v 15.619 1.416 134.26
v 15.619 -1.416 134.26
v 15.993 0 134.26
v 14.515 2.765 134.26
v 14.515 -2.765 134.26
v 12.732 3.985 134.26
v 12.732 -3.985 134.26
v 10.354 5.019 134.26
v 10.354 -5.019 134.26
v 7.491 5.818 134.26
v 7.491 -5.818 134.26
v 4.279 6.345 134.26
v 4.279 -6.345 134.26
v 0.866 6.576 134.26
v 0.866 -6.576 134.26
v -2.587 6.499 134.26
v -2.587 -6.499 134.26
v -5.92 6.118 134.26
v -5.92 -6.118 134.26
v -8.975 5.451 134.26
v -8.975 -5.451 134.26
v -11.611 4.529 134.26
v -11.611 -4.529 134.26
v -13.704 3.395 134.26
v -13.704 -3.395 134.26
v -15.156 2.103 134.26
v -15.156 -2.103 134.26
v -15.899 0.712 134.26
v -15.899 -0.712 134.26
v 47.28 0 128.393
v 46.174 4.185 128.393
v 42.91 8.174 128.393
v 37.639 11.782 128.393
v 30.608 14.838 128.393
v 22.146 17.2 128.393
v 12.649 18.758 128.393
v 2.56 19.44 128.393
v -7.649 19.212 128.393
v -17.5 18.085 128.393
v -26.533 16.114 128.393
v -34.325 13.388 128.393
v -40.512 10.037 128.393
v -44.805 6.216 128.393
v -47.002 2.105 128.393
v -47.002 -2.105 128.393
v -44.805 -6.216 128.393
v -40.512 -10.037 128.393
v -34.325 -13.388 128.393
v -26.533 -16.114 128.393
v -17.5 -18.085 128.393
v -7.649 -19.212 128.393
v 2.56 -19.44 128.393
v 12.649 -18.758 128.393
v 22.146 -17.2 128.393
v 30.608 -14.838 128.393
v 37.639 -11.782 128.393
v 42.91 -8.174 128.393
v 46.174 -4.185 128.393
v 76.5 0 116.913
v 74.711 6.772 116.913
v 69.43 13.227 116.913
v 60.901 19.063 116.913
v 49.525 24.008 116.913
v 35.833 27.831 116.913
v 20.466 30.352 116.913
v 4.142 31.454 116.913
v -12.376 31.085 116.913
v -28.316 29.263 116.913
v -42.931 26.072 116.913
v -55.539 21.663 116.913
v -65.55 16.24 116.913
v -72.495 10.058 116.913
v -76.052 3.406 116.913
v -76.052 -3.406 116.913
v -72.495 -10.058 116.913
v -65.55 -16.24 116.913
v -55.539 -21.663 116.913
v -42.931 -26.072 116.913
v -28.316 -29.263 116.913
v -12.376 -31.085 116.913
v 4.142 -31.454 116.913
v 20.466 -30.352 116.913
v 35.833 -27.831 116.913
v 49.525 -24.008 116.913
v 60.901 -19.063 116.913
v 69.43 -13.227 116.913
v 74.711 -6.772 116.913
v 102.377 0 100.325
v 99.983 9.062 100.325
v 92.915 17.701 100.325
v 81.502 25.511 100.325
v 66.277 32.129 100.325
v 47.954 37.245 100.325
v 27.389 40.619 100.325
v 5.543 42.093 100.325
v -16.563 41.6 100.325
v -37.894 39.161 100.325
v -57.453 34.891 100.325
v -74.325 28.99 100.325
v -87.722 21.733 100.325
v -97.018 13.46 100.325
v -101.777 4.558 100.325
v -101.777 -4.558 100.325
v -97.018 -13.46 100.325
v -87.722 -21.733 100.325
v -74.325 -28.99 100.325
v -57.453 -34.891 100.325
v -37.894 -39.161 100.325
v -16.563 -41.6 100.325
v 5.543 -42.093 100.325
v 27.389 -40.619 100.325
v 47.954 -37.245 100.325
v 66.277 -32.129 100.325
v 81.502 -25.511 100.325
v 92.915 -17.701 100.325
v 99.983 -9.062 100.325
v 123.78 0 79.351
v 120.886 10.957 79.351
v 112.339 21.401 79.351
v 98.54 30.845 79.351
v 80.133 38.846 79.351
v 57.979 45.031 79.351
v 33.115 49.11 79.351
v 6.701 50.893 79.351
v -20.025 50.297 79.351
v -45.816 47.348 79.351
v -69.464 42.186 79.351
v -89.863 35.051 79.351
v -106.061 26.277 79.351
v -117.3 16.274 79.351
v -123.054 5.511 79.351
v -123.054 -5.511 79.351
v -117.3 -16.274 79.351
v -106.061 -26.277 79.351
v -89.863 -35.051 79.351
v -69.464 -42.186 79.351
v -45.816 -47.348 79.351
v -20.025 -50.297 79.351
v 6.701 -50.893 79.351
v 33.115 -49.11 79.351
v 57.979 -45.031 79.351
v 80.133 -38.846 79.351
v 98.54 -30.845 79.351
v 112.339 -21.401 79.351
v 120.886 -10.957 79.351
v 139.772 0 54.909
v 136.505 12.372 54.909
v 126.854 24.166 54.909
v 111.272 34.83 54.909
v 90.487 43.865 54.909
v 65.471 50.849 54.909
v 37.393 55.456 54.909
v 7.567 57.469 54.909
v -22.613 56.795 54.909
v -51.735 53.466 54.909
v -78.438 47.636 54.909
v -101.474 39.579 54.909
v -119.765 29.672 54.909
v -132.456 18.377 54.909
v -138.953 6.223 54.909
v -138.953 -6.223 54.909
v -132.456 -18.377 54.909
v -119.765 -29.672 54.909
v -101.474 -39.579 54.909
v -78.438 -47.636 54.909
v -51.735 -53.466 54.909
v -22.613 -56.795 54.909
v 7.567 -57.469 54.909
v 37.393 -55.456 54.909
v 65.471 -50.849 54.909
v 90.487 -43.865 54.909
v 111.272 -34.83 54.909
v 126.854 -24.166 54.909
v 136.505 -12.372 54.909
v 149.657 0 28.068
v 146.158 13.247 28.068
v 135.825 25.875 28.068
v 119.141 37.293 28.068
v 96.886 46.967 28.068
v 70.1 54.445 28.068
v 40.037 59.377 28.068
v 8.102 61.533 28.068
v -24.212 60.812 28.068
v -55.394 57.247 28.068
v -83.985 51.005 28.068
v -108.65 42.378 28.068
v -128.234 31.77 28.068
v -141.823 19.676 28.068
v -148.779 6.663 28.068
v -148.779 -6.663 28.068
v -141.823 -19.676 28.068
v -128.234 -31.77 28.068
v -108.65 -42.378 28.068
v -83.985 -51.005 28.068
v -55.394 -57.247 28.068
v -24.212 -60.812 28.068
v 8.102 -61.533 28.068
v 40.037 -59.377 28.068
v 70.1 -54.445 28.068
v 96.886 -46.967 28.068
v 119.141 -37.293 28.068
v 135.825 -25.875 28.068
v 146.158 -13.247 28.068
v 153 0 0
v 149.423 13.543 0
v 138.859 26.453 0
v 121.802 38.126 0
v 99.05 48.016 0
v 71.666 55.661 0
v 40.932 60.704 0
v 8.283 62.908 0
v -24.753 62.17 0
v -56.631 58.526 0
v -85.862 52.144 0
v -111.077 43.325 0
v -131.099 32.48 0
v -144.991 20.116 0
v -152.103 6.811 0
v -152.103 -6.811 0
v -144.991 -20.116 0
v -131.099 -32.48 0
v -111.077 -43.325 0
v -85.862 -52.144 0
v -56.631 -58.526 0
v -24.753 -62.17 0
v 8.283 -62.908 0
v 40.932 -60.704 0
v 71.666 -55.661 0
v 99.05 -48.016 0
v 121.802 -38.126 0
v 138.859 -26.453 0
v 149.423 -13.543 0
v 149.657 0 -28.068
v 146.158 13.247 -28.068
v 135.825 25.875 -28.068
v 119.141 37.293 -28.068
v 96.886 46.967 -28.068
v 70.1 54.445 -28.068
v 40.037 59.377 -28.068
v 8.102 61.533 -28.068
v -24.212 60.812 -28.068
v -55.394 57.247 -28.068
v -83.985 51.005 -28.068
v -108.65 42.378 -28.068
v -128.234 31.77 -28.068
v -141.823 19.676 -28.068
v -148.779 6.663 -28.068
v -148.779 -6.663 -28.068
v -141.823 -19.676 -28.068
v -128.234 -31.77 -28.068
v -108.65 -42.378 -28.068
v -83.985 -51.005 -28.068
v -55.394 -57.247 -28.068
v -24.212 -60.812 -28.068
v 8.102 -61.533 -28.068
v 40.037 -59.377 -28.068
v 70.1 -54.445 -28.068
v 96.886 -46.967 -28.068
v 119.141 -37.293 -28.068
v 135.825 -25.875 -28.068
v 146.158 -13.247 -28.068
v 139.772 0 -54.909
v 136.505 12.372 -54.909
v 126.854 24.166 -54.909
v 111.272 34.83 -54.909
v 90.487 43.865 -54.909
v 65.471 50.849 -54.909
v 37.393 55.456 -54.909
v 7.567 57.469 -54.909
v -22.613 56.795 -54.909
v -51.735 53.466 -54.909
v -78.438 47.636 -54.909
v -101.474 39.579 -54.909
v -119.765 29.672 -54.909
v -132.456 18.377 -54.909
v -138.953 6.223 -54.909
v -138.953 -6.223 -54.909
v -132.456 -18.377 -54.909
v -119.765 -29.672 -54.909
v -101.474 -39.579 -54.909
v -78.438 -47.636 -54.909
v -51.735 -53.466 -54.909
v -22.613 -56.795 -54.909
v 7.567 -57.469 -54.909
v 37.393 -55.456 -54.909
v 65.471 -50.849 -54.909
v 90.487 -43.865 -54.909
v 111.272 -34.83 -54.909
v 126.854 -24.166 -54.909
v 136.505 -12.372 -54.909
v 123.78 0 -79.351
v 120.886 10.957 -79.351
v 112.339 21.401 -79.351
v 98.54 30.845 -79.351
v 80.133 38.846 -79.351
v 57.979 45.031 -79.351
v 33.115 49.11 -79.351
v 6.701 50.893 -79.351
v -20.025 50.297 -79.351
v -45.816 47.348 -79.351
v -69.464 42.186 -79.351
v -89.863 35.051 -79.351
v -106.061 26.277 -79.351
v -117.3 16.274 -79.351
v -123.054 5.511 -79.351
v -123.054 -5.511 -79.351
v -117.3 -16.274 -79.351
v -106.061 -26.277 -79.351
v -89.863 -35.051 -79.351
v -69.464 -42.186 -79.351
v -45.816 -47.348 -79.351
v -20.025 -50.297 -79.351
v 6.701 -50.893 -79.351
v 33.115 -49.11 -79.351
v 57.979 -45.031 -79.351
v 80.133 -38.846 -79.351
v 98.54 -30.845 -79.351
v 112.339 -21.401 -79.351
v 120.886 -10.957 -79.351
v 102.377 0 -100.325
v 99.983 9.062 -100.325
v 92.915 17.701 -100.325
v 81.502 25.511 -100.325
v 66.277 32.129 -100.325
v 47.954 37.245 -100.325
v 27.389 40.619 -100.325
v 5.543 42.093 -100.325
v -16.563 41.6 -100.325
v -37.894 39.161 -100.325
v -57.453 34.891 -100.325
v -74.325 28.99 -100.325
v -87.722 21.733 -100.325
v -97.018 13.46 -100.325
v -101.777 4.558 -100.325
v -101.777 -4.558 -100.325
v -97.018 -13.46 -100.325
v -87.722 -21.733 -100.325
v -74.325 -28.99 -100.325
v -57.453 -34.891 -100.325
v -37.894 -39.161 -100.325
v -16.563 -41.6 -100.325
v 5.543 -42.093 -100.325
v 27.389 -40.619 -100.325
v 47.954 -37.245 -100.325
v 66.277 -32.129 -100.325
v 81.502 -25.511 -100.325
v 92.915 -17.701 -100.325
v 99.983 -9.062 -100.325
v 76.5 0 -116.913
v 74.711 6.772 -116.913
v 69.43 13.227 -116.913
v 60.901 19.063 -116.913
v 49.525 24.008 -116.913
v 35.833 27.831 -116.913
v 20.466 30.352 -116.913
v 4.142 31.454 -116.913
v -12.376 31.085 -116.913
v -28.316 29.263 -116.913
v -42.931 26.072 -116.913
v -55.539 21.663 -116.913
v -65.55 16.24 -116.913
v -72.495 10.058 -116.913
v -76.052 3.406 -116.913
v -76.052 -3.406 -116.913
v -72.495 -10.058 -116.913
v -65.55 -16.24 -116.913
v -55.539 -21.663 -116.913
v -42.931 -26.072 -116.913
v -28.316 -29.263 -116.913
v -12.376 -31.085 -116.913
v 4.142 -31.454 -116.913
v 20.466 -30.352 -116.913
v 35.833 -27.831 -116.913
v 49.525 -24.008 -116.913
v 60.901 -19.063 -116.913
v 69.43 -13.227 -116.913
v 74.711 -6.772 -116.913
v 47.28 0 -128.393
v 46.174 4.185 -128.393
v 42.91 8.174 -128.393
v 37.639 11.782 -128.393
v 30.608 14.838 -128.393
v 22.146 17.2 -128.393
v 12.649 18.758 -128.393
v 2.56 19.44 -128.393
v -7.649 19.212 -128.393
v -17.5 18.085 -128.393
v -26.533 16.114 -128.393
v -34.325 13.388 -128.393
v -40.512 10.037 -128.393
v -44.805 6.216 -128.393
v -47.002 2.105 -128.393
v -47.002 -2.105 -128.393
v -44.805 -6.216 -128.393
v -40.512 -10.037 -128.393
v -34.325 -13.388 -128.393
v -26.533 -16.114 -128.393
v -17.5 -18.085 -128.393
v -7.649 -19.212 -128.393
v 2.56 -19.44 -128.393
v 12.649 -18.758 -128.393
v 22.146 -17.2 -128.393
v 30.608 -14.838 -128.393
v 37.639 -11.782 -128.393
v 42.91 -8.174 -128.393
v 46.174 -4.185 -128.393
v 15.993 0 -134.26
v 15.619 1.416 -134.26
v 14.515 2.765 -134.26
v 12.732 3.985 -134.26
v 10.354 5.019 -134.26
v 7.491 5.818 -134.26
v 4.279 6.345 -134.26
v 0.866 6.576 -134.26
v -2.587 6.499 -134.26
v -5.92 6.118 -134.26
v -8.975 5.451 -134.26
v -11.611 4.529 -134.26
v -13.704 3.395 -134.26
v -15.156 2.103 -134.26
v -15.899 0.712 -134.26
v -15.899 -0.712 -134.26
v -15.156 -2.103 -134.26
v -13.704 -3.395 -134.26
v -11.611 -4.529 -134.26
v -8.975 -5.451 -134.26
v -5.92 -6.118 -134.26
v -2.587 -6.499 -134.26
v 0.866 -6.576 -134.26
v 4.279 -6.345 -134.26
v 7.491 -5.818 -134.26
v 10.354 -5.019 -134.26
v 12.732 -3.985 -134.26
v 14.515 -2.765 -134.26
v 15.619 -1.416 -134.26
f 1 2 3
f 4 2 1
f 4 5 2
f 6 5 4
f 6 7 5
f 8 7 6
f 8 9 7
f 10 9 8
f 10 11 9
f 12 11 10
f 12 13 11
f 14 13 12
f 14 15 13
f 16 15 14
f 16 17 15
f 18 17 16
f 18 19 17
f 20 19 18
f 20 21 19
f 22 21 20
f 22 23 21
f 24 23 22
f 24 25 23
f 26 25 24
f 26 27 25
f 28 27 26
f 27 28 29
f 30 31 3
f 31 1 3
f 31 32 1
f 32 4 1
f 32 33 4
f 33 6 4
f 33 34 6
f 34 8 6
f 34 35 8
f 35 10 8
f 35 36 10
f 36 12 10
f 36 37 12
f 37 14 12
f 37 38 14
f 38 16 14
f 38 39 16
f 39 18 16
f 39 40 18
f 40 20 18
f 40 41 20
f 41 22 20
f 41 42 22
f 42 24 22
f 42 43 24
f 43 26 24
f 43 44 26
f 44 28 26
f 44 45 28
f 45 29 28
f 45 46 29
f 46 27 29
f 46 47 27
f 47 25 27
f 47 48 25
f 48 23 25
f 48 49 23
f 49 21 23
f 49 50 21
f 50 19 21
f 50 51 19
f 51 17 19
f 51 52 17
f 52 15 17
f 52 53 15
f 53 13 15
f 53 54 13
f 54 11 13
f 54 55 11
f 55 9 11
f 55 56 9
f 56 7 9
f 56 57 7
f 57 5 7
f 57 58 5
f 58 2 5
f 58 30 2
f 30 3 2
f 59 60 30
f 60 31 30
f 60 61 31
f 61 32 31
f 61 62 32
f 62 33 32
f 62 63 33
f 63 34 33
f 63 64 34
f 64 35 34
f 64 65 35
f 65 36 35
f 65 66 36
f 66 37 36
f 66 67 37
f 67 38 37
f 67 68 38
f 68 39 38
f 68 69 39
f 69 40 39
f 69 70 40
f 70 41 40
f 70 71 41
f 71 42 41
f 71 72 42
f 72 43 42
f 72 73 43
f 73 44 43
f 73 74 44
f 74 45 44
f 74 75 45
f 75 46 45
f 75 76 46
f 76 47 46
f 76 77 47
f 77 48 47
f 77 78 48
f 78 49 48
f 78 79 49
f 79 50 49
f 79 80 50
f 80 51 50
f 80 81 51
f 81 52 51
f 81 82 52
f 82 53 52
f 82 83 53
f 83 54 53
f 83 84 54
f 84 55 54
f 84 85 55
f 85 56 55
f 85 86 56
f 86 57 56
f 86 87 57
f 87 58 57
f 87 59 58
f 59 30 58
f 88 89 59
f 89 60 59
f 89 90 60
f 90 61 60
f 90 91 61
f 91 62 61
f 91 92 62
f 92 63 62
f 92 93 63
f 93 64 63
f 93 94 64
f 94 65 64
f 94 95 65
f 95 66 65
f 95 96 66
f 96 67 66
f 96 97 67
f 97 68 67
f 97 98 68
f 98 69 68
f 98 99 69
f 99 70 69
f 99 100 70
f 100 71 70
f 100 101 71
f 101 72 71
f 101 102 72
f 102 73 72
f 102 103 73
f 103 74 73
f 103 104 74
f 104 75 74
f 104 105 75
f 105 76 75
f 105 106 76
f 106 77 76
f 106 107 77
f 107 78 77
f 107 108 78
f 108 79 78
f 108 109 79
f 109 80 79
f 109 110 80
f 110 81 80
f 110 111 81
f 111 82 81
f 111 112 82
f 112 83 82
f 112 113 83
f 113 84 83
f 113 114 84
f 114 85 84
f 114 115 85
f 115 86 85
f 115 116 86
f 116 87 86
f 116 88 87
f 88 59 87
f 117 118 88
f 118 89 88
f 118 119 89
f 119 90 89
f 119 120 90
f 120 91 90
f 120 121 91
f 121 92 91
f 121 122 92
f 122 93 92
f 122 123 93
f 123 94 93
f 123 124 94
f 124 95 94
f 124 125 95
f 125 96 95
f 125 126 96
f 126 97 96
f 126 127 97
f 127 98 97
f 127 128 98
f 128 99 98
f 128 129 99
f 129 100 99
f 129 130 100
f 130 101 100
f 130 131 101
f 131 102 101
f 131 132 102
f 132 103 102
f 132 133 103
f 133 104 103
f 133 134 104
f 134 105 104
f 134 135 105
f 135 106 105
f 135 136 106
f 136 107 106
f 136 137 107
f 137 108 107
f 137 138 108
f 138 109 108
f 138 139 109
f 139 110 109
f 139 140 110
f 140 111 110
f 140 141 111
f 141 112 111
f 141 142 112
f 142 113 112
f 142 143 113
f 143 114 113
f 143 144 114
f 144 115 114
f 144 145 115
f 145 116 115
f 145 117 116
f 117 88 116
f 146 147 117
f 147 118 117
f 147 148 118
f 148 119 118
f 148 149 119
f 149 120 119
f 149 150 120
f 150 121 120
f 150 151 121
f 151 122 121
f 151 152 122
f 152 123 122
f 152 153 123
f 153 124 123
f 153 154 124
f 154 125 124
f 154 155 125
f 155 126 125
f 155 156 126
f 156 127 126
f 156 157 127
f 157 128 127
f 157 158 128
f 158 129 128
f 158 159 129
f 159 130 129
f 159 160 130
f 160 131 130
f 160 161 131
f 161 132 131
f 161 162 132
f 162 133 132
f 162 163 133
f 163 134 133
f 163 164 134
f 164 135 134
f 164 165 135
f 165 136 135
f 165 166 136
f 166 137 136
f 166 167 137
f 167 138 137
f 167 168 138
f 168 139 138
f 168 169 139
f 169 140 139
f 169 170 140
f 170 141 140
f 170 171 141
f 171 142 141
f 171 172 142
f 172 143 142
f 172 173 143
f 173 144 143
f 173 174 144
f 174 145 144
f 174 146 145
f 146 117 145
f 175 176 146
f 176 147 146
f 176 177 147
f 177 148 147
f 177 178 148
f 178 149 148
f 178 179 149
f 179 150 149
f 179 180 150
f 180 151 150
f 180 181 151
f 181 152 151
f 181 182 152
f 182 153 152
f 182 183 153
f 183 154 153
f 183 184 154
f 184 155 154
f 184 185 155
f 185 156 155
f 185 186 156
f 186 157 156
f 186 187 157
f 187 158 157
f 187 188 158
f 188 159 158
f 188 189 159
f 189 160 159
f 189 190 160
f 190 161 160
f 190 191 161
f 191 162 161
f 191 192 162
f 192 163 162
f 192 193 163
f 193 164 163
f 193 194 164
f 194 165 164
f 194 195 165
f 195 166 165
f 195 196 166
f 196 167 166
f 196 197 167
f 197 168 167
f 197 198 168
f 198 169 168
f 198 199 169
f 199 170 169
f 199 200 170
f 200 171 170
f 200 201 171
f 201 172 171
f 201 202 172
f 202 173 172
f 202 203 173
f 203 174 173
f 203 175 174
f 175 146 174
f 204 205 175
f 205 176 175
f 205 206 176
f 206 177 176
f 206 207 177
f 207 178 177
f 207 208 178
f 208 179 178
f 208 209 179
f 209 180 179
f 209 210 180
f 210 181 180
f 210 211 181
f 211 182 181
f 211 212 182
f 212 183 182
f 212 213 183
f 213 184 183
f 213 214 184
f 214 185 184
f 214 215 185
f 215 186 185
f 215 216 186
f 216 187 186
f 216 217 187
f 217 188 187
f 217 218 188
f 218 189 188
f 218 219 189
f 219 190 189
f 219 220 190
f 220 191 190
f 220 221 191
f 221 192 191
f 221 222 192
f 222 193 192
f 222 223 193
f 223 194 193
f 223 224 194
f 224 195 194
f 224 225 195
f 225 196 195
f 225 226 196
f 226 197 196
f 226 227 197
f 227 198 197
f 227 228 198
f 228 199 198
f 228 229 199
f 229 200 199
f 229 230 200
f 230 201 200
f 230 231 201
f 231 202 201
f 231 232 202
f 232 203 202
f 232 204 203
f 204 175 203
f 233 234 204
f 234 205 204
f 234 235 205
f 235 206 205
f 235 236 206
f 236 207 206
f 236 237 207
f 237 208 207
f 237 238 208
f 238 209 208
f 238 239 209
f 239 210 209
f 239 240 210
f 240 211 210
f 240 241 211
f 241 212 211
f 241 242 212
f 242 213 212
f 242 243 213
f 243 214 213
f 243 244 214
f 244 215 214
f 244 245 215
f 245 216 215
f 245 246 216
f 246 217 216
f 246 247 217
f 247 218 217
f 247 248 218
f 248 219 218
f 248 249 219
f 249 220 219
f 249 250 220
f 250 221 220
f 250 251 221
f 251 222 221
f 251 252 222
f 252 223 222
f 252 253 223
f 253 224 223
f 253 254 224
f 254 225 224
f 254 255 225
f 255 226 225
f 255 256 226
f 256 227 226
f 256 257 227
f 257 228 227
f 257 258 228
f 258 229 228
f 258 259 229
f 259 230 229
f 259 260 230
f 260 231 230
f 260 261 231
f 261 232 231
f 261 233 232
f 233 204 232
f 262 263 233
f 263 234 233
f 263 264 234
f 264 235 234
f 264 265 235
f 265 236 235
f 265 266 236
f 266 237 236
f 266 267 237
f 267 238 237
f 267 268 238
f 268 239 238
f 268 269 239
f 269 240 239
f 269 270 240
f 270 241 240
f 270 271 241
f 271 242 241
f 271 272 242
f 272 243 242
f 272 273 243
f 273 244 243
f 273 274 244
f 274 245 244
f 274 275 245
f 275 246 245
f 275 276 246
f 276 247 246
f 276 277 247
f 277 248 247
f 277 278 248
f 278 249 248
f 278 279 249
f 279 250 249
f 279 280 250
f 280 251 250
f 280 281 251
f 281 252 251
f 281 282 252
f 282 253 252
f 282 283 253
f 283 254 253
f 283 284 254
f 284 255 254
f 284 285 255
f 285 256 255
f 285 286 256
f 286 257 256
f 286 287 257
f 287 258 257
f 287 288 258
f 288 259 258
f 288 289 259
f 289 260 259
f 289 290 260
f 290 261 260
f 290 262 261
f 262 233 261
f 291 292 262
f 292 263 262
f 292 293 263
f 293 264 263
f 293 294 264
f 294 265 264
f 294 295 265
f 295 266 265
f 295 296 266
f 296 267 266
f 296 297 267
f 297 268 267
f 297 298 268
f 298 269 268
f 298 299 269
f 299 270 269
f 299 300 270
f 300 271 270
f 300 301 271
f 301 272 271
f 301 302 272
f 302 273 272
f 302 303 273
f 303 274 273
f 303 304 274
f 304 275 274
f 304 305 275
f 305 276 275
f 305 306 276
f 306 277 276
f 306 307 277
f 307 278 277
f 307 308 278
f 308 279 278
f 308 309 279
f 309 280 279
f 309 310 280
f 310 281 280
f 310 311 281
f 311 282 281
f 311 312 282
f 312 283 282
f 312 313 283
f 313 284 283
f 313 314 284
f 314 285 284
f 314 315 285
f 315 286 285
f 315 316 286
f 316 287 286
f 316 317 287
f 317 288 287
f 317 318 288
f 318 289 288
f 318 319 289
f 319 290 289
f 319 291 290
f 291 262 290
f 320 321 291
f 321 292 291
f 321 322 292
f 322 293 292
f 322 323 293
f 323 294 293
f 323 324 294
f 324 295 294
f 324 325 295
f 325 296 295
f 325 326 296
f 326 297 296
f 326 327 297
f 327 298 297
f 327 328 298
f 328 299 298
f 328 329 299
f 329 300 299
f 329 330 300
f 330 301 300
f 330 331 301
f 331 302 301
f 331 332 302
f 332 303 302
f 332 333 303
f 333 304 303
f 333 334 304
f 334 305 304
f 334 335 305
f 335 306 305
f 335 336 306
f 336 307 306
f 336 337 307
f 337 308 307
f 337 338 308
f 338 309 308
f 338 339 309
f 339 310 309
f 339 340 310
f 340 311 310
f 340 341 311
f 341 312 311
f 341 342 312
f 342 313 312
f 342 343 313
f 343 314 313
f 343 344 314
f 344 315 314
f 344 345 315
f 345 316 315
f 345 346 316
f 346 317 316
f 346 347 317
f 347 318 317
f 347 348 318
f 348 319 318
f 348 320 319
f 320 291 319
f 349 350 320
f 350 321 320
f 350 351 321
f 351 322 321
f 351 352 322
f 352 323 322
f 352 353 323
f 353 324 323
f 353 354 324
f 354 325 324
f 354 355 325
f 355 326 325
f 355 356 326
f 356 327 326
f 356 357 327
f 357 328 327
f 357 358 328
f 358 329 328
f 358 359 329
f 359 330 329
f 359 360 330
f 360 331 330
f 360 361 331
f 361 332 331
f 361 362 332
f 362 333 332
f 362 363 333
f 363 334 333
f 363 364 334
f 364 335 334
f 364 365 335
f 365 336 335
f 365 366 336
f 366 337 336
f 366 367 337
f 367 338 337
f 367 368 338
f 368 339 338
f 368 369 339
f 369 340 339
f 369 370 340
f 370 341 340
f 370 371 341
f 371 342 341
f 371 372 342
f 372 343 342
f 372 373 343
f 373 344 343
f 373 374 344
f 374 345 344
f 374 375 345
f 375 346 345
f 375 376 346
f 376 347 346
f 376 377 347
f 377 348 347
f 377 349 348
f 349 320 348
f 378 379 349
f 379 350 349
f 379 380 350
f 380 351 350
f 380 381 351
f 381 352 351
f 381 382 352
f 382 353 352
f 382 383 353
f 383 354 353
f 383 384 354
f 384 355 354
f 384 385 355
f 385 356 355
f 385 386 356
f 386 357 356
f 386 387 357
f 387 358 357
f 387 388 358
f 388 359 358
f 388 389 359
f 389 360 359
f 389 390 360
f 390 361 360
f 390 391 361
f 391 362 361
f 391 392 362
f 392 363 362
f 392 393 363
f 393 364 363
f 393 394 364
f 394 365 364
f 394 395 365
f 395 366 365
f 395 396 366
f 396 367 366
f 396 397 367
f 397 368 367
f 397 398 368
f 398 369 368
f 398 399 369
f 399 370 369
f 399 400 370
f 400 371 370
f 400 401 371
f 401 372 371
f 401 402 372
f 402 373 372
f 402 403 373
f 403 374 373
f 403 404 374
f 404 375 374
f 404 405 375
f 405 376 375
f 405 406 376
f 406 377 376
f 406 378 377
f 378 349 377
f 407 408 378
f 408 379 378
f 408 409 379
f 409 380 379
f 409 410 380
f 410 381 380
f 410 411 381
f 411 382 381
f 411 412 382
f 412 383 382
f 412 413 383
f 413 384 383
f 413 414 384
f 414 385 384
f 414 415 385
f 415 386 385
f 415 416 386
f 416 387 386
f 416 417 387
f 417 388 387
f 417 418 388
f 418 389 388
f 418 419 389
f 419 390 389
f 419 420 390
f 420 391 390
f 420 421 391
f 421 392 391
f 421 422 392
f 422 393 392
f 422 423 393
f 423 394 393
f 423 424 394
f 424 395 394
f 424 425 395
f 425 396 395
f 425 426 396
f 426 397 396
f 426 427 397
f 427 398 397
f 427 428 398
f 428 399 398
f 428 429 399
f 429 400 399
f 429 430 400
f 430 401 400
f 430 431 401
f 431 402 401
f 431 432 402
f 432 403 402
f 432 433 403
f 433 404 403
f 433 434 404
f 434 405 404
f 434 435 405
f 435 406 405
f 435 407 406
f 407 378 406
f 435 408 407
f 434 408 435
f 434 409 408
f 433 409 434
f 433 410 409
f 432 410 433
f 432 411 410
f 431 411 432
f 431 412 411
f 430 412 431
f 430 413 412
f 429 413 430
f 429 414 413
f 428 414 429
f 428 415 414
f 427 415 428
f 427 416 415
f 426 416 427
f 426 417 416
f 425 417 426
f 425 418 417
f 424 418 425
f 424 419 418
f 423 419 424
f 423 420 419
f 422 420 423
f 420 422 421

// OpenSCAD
// Generated by SolidPython 1.0.1 on 2020-07-29 00:46:52


scale(v = [17, 7, 15]) {
	sphere(r = 9);
}
/***********************************************
*********      SolidPython code:      **********
************************************************
 
# import packages: SolidPython
from solid import *
from solid.utils import *
from itertools import chain, combinations, permutations


class Resize:

    def __init__(self, scad_file):
        self.scad_file = scad_file
        #self.scad_file = import_scad(scad_file)
        # cone/cylinder param:
        self.r1 = 0
        self.r2 = 0
        self.h = 0
        # rectangular prism param:
        self.w = 0
        self.l = 0
        # ellipse param:
        self.r = 0

    # import OpenScad code (file name corresponds to shape)


    # classify shape + parameters
    def assign(self, param1, param2, param3):
        if self.scad_file == 'cone.scad':
            self.r1 = param1
            self.r2 = param2
            self.h = param3
        elif self.scad_file == 'cylinder.scad':
            self.r1 = param1
            self.r2 = param2
            self.h = param3
        elif self.scad_file == 'rectangularPrism.scad':
            self.h = param1
            self.l = param2
            self.w = param3
        else:
            self.r = param1
            self.h = param2

    # resize parameters
    def iterate(self):
        x = range(3, 20, 2)
        i = 1
        if self.scad_file == 'cone.scad':
            tempList = list(permutations(x, 2))
            for temp in tempList:
                param1 = temp[0]
                param2 = temp[1]
                filepath = 'produced_scad_files/' + 'cone' + str(param1) + '_' + str(param2) + '_' + '.scad'
                scad_render_to_file(cylinder(h=param1, r1=param2, r2=0), filepath)

        elif self.scad_file == 'cylinder.scad':
            tempList = list(permutations(x, 3))
            for temp in tempList:
                param1 = temp[0]
                param2 = temp[1]
                filepath = 'produced_scad_files/' + 'cylinder' + str(param1) + '_' + str(param2) + '_' + '.scad'
                scad_render_to_file(cylinder(h=param1, r1=param2, r2=param2), filepath)

        elif self.scad_file == 'rectangularPrism.scad':
            tempList = list(permutations(x, 3))
            for temp in tempList:
                param1 = temp[0]
                param2 = temp[1]
                param3 = temp[2]
                filepath = 'produced_scad_files/' + 'rectangularPrism' + str(param1) + '_' + str(param2) + '_' + str(
                    param3) + '.scad'
                scad_render_to_file(cube(size=(param1, param2, param3)), filepath)

        elif self.scad_file == 'ellipse.scad':
            tempList = list(permutations(x, 4))
            for temp in tempList:
                param1 = temp[0]
                param2 = temp[1]
                param3 = temp[2]
                param4 = temp[3]
                filepath = 'produced_scad_files/' + 'ellipse' + str(param1) + '_' + str(param2) + '_' + str(param3) + '_' + str(param4) + '.scad'
                scad_render_to_file(scale([param1, param2, param3])(sphere(r=param4)), filepath)

    def render_to_scadfile(self):
        scad_render_to_file(scad, 'example.scad') 
 
************************************************/
